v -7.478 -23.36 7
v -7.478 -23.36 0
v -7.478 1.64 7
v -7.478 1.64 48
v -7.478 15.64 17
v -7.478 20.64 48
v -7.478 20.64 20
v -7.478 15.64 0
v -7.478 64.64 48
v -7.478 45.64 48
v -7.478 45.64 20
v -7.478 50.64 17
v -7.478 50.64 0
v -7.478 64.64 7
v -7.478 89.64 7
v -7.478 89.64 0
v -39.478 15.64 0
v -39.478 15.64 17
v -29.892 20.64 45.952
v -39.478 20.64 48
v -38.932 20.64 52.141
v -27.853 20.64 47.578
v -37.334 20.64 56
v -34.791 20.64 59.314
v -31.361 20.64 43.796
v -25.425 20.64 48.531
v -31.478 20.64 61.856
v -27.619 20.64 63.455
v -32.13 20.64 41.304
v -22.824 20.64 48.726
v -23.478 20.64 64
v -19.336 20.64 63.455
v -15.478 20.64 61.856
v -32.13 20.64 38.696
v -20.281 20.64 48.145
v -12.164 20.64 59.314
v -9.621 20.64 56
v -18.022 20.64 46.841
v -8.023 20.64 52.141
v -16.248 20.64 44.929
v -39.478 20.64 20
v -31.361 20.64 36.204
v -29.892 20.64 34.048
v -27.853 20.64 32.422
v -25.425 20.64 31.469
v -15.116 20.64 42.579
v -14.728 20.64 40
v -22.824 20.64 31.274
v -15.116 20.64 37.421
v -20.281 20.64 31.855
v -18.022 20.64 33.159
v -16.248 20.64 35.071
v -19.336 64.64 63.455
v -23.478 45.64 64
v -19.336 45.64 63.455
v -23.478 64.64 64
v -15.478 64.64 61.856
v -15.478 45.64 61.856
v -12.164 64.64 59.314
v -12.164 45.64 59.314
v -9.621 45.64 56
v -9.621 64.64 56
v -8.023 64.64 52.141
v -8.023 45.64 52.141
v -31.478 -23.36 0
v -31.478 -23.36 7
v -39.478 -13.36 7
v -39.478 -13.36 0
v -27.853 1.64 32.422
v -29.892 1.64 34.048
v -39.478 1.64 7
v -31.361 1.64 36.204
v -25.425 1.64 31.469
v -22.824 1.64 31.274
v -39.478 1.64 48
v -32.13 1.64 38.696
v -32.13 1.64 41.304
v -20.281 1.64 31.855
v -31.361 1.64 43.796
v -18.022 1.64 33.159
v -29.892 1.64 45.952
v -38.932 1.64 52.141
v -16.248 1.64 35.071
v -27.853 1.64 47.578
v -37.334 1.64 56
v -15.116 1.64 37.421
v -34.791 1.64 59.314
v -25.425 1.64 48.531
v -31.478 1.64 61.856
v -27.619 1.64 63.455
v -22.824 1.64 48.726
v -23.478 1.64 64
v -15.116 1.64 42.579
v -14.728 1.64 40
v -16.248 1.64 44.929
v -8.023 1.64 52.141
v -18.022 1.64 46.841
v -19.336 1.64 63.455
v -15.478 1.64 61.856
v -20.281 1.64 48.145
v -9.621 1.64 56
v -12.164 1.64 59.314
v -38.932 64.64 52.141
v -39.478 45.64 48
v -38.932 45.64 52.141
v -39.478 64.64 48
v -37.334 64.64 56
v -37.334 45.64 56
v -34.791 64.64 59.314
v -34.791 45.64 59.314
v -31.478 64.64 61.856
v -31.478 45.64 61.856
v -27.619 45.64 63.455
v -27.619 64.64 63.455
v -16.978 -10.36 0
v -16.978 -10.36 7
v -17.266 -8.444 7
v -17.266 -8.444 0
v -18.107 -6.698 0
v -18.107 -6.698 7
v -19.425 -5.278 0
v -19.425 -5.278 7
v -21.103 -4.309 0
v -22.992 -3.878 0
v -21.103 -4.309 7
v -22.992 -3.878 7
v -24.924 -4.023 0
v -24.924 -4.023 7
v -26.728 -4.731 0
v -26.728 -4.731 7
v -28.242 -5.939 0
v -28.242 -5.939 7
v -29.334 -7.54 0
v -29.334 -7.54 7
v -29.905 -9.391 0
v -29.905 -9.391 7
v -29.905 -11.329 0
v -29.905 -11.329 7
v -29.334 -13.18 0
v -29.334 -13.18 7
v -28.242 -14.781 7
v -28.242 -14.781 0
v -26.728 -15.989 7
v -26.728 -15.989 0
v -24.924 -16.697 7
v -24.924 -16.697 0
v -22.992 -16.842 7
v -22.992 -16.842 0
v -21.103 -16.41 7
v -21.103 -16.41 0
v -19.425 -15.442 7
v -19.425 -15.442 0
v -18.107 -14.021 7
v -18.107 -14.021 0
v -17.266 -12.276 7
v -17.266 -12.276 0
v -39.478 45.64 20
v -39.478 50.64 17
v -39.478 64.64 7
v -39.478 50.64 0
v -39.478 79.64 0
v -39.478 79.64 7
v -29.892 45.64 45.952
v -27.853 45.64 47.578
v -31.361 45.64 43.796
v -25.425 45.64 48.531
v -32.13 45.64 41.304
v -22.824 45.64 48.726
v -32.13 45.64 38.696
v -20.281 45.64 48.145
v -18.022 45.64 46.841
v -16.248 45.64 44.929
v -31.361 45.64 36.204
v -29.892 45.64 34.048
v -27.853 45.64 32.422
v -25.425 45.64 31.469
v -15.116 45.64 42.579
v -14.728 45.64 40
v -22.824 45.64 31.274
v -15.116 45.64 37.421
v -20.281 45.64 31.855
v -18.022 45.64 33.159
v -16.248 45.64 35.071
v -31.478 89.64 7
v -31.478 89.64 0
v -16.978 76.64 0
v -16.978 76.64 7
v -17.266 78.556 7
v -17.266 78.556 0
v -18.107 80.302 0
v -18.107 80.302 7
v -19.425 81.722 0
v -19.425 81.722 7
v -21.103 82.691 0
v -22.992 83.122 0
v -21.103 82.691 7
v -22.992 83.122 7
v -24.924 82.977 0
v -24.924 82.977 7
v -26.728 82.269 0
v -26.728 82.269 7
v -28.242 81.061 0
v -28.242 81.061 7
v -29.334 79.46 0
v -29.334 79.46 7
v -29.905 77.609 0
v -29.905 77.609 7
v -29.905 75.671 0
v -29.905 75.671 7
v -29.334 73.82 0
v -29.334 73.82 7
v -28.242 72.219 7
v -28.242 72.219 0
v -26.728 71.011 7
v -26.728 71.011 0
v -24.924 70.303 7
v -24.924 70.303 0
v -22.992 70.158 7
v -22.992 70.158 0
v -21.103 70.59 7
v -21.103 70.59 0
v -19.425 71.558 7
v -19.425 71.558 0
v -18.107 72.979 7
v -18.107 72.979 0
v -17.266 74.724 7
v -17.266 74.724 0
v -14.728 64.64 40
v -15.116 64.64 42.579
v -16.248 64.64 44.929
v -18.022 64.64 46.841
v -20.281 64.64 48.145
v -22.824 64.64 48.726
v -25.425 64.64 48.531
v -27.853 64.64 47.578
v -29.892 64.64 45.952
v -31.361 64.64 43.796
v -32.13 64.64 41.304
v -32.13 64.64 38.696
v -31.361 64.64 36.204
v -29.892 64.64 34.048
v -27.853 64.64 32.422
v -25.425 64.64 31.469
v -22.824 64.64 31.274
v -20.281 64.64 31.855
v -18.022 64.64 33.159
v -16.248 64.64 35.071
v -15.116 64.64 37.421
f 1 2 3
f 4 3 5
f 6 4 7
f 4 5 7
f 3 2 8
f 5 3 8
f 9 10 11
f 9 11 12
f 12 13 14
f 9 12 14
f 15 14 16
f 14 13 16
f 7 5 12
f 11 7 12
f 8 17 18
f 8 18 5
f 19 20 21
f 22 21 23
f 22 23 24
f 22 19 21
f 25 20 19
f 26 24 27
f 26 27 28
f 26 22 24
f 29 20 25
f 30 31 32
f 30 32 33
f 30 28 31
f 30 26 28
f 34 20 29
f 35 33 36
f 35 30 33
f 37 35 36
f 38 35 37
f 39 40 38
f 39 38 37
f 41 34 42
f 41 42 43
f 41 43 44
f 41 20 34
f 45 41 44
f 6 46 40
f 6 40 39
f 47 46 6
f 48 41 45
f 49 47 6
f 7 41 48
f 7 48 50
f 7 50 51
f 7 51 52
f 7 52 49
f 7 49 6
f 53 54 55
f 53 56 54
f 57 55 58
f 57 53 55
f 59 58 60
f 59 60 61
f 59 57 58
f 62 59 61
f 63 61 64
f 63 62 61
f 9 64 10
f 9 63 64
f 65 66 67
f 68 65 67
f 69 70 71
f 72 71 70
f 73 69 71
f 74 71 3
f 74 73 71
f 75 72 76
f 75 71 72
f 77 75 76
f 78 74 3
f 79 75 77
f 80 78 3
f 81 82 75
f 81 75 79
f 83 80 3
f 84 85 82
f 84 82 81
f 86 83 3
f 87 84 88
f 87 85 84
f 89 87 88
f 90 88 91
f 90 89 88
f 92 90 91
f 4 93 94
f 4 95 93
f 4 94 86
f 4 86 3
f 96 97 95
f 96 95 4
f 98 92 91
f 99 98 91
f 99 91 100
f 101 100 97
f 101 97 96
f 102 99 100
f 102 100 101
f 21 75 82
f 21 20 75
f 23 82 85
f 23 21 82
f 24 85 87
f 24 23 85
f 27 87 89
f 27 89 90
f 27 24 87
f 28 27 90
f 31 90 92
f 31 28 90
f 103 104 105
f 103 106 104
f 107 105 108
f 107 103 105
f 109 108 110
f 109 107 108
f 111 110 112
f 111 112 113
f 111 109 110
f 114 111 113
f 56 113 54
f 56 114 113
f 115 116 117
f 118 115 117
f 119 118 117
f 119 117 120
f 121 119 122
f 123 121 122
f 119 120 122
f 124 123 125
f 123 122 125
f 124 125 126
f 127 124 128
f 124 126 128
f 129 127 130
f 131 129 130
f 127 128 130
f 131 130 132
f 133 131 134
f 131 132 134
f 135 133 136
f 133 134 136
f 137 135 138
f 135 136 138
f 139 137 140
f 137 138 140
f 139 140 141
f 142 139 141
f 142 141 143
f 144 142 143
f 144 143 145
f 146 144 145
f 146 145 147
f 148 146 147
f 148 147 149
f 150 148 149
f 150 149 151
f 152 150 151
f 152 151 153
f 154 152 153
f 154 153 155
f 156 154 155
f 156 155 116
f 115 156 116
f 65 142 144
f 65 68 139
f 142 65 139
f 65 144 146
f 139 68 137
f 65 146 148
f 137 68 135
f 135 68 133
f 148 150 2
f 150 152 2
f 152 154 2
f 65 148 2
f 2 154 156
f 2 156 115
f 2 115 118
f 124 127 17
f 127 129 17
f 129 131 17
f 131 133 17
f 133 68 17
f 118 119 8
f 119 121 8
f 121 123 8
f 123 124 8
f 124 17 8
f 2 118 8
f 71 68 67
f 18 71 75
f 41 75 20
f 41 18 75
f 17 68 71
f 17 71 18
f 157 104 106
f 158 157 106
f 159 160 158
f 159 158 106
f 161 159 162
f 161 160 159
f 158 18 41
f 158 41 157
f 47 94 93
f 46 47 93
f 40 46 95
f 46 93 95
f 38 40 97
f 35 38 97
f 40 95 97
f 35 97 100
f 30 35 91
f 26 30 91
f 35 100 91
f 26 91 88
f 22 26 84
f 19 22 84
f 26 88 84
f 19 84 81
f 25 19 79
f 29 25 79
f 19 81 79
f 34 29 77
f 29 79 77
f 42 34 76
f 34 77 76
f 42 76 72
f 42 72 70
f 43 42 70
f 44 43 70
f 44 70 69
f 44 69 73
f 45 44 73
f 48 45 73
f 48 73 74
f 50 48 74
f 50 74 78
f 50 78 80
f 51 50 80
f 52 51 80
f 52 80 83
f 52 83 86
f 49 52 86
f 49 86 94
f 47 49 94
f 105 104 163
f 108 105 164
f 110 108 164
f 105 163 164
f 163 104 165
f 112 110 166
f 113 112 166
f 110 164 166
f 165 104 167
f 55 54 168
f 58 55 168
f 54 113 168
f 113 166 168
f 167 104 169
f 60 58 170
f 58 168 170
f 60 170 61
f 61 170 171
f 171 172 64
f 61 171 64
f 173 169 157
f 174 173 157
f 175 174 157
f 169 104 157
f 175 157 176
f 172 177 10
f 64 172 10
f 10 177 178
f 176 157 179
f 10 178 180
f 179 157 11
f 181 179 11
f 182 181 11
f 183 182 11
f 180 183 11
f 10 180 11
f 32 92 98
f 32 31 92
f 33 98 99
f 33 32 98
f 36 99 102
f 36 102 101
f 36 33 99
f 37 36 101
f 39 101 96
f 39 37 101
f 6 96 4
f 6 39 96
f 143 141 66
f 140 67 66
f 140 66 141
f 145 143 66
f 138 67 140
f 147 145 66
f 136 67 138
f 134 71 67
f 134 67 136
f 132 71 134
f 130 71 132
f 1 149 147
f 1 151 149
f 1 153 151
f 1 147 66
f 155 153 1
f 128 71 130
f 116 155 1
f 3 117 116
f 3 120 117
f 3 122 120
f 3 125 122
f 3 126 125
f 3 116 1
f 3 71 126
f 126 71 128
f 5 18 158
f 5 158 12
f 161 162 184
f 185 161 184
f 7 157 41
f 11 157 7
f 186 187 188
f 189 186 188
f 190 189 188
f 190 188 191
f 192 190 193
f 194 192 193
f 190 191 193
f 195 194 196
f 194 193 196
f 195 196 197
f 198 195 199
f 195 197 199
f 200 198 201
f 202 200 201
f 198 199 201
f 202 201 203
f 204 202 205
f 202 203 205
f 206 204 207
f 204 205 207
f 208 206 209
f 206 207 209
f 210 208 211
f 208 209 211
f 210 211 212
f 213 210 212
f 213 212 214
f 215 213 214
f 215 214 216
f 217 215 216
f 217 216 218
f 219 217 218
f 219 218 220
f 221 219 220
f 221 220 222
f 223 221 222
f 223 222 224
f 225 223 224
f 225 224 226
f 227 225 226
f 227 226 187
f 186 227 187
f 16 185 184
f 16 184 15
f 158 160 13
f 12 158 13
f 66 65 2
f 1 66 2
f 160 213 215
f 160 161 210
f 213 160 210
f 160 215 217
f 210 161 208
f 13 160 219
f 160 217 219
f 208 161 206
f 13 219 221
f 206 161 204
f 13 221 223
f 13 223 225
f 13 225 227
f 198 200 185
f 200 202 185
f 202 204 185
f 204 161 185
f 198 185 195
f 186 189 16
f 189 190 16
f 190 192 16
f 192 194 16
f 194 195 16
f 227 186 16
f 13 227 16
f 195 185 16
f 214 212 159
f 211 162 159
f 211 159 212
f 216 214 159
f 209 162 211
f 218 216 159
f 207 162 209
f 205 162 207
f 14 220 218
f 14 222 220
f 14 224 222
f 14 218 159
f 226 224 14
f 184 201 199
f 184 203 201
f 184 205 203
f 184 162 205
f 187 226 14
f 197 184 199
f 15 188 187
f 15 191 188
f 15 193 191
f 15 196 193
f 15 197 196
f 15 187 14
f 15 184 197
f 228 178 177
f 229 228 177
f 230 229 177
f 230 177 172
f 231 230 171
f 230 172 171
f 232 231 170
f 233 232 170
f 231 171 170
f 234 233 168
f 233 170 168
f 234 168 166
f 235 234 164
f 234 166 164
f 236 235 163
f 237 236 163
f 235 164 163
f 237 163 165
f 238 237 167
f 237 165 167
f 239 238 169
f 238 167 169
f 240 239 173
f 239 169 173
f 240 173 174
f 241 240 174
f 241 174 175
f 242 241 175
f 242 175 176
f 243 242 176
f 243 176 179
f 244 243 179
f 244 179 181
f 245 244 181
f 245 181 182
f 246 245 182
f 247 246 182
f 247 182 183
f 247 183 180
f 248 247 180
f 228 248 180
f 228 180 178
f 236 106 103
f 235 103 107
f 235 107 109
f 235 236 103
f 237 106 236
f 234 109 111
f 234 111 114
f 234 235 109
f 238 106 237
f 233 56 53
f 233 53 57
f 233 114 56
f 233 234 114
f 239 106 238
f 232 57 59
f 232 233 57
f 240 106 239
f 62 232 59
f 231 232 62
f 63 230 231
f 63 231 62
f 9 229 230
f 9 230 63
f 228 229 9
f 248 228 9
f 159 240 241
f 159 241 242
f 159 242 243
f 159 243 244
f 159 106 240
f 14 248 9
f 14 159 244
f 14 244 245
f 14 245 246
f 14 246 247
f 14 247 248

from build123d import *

# Parameters (mm, degrees)
F0_W      = 32
F0_H      = 113
F1_DEPTH  = 20
F2_W      = 32
F2_H      = 25
F3_DEPTH  = 13
F4_W      = 32
F4_H      = 35
F5_DEPTH  = 17
F6_W      = 32
F6_H      = 19
F7_DEPTH  = 44
F8_R      = 16
F9_R      = 15.99999
F10_R     = 16
F11_R     = 15.99999
F12_R     = 6.5
F13_DEPTH = 13
F14_R     = 6.5
F15_DEPTH = 13
F17_DEPTH = 25
F19_DEPTH = 25
F20_R     = 8.75
F21_DEPTH = 100


# Not quite as in the source:
# - a fillet or chamfer is up to 0.001 mm smaller than in the source, because OpenCascade refuses the exact size


with BuildPart() as f1:
    # F0 (on Top) → F1 (new body)
    with BuildSketch(Plane.XY):
        with Locations((-23.4775710851, 33.1401875504)):
            Rectangle(F0_W, F0_H)
    extrude(amount=F1_DEPTH)

    # F2 (on face) → F3 (cut)
    with BuildSketch(Plane.XY.offset(20)):
        with Locations((-23.4775710851, 77.1401875504)):
            Rectangle(F2_W, F2_H)
        with Locations((-23.4775710851, -10.8598124496)):
            Rectangle(F2_W, F2_H)
    extrude(amount=-F3_DEPTH, mode=Mode.SUBTRACT)

    # F4 (on face) → F5 (cut)
    with BuildSketch(Plane(origin=(0, 0, 0), x_dir=(1, 0, 0), z_dir=(0, 0, -1))):
        with Locations((-23.4775710851, -33.1401875504)):
            Rectangle(F4_W, F4_H)
    extrude(amount=-F5_DEPTH, mode=Mode.SUBTRACT)

    # F6 (on face) → F7 (join)
    with BuildSketch(Plane.XY.offset(20)):
        with Locations((-23.4775710851, 55.1401875504)):
            Rectangle(F6_W, F6_H)
        with Locations((-23.4775710851, 11.1401875504)):
            Rectangle(F6_W, F6_H)
    extrude(amount=F7_DEPTH)

    # F8
    f8_edges = [f1.edges().sort_by_distance(p)[0] for p in [
        (-39.477571, 55.140188, 64),
    ]]
    fillet(f8_edges, radius=F8_R)

    # F9 (radius 16 in the source; OpenCascade refuses exactly that, so slightly less here)
    f9_edges = [f1.edges().sort_by_distance(p)[0] for p in [
        (-7.477571, 55.140188, 64),
    ]]
    fillet(f9_edges, radius=F9_R)

    # F10
    f10_edges = [f1.edges().sort_by_distance(p)[0] for p in [
        (-39.477571, 11.140188, 64),
    ]]
    fillet(f10_edges, radius=F10_R)

    # F11 (radius 16 in the source; OpenCascade refuses exactly that, so slightly less here)
    f11_edges = [f1.edges().sort_by_distance(p)[0] for p in [
        (-7.477571, 11.140188, 64),
    ]]
    fillet(f11_edges, radius=F11_R)

    # F12 (on face) → F13 (cut)
    with BuildSketch(Plane.XY.offset(7)):
        with Locations((-23.4775710851, -10.3598124496)):
            Circle(F12_R)
    extrude(amount=-F13_DEPTH, mode=Mode.SUBTRACT)

    # F14 (on face) → F15 (cut)
    with BuildSketch(Plane.XY.offset(7)):
        with Locations((-23.4775710851, 76.6401875504)):
            Circle(F14_R)
    extrude(amount=-F15_DEPTH, mode=Mode.SUBTRACT)

    # F16 (on face) → F17 (cut)
    with BuildSketch(Plane.XY.offset(7)):
        Polygon((-39.4775710851, -13.3598124496), (-39.4775710851, -23.3598124496), (-31.4775710851, -23.3598124496), align=None)
    extrude(amount=-F17_DEPTH, mode=Mode.SUBTRACT)

    # F18 (on face) → F19 (cut)
    with BuildSketch(Plane.XY.offset(7)):
        Polygon((-31.4775710851, 89.6401875504), (-39.4775710851, 89.6401875504), (-39.4775710851, 79.6401875504), align=None)
    extrude(amount=-F19_DEPTH, mode=Mode.SUBTRACT)

    # F20 (on face) → F21 (cut)
    with BuildSketch(Plane.XZ.offset(-1.6401875504)):
        with Locations((-23.4775710851, 40)):
            Circle(F20_R)
    extrude(amount=-F21_DEPTH, mode=Mode.SUBTRACT)


solid = f1.part
